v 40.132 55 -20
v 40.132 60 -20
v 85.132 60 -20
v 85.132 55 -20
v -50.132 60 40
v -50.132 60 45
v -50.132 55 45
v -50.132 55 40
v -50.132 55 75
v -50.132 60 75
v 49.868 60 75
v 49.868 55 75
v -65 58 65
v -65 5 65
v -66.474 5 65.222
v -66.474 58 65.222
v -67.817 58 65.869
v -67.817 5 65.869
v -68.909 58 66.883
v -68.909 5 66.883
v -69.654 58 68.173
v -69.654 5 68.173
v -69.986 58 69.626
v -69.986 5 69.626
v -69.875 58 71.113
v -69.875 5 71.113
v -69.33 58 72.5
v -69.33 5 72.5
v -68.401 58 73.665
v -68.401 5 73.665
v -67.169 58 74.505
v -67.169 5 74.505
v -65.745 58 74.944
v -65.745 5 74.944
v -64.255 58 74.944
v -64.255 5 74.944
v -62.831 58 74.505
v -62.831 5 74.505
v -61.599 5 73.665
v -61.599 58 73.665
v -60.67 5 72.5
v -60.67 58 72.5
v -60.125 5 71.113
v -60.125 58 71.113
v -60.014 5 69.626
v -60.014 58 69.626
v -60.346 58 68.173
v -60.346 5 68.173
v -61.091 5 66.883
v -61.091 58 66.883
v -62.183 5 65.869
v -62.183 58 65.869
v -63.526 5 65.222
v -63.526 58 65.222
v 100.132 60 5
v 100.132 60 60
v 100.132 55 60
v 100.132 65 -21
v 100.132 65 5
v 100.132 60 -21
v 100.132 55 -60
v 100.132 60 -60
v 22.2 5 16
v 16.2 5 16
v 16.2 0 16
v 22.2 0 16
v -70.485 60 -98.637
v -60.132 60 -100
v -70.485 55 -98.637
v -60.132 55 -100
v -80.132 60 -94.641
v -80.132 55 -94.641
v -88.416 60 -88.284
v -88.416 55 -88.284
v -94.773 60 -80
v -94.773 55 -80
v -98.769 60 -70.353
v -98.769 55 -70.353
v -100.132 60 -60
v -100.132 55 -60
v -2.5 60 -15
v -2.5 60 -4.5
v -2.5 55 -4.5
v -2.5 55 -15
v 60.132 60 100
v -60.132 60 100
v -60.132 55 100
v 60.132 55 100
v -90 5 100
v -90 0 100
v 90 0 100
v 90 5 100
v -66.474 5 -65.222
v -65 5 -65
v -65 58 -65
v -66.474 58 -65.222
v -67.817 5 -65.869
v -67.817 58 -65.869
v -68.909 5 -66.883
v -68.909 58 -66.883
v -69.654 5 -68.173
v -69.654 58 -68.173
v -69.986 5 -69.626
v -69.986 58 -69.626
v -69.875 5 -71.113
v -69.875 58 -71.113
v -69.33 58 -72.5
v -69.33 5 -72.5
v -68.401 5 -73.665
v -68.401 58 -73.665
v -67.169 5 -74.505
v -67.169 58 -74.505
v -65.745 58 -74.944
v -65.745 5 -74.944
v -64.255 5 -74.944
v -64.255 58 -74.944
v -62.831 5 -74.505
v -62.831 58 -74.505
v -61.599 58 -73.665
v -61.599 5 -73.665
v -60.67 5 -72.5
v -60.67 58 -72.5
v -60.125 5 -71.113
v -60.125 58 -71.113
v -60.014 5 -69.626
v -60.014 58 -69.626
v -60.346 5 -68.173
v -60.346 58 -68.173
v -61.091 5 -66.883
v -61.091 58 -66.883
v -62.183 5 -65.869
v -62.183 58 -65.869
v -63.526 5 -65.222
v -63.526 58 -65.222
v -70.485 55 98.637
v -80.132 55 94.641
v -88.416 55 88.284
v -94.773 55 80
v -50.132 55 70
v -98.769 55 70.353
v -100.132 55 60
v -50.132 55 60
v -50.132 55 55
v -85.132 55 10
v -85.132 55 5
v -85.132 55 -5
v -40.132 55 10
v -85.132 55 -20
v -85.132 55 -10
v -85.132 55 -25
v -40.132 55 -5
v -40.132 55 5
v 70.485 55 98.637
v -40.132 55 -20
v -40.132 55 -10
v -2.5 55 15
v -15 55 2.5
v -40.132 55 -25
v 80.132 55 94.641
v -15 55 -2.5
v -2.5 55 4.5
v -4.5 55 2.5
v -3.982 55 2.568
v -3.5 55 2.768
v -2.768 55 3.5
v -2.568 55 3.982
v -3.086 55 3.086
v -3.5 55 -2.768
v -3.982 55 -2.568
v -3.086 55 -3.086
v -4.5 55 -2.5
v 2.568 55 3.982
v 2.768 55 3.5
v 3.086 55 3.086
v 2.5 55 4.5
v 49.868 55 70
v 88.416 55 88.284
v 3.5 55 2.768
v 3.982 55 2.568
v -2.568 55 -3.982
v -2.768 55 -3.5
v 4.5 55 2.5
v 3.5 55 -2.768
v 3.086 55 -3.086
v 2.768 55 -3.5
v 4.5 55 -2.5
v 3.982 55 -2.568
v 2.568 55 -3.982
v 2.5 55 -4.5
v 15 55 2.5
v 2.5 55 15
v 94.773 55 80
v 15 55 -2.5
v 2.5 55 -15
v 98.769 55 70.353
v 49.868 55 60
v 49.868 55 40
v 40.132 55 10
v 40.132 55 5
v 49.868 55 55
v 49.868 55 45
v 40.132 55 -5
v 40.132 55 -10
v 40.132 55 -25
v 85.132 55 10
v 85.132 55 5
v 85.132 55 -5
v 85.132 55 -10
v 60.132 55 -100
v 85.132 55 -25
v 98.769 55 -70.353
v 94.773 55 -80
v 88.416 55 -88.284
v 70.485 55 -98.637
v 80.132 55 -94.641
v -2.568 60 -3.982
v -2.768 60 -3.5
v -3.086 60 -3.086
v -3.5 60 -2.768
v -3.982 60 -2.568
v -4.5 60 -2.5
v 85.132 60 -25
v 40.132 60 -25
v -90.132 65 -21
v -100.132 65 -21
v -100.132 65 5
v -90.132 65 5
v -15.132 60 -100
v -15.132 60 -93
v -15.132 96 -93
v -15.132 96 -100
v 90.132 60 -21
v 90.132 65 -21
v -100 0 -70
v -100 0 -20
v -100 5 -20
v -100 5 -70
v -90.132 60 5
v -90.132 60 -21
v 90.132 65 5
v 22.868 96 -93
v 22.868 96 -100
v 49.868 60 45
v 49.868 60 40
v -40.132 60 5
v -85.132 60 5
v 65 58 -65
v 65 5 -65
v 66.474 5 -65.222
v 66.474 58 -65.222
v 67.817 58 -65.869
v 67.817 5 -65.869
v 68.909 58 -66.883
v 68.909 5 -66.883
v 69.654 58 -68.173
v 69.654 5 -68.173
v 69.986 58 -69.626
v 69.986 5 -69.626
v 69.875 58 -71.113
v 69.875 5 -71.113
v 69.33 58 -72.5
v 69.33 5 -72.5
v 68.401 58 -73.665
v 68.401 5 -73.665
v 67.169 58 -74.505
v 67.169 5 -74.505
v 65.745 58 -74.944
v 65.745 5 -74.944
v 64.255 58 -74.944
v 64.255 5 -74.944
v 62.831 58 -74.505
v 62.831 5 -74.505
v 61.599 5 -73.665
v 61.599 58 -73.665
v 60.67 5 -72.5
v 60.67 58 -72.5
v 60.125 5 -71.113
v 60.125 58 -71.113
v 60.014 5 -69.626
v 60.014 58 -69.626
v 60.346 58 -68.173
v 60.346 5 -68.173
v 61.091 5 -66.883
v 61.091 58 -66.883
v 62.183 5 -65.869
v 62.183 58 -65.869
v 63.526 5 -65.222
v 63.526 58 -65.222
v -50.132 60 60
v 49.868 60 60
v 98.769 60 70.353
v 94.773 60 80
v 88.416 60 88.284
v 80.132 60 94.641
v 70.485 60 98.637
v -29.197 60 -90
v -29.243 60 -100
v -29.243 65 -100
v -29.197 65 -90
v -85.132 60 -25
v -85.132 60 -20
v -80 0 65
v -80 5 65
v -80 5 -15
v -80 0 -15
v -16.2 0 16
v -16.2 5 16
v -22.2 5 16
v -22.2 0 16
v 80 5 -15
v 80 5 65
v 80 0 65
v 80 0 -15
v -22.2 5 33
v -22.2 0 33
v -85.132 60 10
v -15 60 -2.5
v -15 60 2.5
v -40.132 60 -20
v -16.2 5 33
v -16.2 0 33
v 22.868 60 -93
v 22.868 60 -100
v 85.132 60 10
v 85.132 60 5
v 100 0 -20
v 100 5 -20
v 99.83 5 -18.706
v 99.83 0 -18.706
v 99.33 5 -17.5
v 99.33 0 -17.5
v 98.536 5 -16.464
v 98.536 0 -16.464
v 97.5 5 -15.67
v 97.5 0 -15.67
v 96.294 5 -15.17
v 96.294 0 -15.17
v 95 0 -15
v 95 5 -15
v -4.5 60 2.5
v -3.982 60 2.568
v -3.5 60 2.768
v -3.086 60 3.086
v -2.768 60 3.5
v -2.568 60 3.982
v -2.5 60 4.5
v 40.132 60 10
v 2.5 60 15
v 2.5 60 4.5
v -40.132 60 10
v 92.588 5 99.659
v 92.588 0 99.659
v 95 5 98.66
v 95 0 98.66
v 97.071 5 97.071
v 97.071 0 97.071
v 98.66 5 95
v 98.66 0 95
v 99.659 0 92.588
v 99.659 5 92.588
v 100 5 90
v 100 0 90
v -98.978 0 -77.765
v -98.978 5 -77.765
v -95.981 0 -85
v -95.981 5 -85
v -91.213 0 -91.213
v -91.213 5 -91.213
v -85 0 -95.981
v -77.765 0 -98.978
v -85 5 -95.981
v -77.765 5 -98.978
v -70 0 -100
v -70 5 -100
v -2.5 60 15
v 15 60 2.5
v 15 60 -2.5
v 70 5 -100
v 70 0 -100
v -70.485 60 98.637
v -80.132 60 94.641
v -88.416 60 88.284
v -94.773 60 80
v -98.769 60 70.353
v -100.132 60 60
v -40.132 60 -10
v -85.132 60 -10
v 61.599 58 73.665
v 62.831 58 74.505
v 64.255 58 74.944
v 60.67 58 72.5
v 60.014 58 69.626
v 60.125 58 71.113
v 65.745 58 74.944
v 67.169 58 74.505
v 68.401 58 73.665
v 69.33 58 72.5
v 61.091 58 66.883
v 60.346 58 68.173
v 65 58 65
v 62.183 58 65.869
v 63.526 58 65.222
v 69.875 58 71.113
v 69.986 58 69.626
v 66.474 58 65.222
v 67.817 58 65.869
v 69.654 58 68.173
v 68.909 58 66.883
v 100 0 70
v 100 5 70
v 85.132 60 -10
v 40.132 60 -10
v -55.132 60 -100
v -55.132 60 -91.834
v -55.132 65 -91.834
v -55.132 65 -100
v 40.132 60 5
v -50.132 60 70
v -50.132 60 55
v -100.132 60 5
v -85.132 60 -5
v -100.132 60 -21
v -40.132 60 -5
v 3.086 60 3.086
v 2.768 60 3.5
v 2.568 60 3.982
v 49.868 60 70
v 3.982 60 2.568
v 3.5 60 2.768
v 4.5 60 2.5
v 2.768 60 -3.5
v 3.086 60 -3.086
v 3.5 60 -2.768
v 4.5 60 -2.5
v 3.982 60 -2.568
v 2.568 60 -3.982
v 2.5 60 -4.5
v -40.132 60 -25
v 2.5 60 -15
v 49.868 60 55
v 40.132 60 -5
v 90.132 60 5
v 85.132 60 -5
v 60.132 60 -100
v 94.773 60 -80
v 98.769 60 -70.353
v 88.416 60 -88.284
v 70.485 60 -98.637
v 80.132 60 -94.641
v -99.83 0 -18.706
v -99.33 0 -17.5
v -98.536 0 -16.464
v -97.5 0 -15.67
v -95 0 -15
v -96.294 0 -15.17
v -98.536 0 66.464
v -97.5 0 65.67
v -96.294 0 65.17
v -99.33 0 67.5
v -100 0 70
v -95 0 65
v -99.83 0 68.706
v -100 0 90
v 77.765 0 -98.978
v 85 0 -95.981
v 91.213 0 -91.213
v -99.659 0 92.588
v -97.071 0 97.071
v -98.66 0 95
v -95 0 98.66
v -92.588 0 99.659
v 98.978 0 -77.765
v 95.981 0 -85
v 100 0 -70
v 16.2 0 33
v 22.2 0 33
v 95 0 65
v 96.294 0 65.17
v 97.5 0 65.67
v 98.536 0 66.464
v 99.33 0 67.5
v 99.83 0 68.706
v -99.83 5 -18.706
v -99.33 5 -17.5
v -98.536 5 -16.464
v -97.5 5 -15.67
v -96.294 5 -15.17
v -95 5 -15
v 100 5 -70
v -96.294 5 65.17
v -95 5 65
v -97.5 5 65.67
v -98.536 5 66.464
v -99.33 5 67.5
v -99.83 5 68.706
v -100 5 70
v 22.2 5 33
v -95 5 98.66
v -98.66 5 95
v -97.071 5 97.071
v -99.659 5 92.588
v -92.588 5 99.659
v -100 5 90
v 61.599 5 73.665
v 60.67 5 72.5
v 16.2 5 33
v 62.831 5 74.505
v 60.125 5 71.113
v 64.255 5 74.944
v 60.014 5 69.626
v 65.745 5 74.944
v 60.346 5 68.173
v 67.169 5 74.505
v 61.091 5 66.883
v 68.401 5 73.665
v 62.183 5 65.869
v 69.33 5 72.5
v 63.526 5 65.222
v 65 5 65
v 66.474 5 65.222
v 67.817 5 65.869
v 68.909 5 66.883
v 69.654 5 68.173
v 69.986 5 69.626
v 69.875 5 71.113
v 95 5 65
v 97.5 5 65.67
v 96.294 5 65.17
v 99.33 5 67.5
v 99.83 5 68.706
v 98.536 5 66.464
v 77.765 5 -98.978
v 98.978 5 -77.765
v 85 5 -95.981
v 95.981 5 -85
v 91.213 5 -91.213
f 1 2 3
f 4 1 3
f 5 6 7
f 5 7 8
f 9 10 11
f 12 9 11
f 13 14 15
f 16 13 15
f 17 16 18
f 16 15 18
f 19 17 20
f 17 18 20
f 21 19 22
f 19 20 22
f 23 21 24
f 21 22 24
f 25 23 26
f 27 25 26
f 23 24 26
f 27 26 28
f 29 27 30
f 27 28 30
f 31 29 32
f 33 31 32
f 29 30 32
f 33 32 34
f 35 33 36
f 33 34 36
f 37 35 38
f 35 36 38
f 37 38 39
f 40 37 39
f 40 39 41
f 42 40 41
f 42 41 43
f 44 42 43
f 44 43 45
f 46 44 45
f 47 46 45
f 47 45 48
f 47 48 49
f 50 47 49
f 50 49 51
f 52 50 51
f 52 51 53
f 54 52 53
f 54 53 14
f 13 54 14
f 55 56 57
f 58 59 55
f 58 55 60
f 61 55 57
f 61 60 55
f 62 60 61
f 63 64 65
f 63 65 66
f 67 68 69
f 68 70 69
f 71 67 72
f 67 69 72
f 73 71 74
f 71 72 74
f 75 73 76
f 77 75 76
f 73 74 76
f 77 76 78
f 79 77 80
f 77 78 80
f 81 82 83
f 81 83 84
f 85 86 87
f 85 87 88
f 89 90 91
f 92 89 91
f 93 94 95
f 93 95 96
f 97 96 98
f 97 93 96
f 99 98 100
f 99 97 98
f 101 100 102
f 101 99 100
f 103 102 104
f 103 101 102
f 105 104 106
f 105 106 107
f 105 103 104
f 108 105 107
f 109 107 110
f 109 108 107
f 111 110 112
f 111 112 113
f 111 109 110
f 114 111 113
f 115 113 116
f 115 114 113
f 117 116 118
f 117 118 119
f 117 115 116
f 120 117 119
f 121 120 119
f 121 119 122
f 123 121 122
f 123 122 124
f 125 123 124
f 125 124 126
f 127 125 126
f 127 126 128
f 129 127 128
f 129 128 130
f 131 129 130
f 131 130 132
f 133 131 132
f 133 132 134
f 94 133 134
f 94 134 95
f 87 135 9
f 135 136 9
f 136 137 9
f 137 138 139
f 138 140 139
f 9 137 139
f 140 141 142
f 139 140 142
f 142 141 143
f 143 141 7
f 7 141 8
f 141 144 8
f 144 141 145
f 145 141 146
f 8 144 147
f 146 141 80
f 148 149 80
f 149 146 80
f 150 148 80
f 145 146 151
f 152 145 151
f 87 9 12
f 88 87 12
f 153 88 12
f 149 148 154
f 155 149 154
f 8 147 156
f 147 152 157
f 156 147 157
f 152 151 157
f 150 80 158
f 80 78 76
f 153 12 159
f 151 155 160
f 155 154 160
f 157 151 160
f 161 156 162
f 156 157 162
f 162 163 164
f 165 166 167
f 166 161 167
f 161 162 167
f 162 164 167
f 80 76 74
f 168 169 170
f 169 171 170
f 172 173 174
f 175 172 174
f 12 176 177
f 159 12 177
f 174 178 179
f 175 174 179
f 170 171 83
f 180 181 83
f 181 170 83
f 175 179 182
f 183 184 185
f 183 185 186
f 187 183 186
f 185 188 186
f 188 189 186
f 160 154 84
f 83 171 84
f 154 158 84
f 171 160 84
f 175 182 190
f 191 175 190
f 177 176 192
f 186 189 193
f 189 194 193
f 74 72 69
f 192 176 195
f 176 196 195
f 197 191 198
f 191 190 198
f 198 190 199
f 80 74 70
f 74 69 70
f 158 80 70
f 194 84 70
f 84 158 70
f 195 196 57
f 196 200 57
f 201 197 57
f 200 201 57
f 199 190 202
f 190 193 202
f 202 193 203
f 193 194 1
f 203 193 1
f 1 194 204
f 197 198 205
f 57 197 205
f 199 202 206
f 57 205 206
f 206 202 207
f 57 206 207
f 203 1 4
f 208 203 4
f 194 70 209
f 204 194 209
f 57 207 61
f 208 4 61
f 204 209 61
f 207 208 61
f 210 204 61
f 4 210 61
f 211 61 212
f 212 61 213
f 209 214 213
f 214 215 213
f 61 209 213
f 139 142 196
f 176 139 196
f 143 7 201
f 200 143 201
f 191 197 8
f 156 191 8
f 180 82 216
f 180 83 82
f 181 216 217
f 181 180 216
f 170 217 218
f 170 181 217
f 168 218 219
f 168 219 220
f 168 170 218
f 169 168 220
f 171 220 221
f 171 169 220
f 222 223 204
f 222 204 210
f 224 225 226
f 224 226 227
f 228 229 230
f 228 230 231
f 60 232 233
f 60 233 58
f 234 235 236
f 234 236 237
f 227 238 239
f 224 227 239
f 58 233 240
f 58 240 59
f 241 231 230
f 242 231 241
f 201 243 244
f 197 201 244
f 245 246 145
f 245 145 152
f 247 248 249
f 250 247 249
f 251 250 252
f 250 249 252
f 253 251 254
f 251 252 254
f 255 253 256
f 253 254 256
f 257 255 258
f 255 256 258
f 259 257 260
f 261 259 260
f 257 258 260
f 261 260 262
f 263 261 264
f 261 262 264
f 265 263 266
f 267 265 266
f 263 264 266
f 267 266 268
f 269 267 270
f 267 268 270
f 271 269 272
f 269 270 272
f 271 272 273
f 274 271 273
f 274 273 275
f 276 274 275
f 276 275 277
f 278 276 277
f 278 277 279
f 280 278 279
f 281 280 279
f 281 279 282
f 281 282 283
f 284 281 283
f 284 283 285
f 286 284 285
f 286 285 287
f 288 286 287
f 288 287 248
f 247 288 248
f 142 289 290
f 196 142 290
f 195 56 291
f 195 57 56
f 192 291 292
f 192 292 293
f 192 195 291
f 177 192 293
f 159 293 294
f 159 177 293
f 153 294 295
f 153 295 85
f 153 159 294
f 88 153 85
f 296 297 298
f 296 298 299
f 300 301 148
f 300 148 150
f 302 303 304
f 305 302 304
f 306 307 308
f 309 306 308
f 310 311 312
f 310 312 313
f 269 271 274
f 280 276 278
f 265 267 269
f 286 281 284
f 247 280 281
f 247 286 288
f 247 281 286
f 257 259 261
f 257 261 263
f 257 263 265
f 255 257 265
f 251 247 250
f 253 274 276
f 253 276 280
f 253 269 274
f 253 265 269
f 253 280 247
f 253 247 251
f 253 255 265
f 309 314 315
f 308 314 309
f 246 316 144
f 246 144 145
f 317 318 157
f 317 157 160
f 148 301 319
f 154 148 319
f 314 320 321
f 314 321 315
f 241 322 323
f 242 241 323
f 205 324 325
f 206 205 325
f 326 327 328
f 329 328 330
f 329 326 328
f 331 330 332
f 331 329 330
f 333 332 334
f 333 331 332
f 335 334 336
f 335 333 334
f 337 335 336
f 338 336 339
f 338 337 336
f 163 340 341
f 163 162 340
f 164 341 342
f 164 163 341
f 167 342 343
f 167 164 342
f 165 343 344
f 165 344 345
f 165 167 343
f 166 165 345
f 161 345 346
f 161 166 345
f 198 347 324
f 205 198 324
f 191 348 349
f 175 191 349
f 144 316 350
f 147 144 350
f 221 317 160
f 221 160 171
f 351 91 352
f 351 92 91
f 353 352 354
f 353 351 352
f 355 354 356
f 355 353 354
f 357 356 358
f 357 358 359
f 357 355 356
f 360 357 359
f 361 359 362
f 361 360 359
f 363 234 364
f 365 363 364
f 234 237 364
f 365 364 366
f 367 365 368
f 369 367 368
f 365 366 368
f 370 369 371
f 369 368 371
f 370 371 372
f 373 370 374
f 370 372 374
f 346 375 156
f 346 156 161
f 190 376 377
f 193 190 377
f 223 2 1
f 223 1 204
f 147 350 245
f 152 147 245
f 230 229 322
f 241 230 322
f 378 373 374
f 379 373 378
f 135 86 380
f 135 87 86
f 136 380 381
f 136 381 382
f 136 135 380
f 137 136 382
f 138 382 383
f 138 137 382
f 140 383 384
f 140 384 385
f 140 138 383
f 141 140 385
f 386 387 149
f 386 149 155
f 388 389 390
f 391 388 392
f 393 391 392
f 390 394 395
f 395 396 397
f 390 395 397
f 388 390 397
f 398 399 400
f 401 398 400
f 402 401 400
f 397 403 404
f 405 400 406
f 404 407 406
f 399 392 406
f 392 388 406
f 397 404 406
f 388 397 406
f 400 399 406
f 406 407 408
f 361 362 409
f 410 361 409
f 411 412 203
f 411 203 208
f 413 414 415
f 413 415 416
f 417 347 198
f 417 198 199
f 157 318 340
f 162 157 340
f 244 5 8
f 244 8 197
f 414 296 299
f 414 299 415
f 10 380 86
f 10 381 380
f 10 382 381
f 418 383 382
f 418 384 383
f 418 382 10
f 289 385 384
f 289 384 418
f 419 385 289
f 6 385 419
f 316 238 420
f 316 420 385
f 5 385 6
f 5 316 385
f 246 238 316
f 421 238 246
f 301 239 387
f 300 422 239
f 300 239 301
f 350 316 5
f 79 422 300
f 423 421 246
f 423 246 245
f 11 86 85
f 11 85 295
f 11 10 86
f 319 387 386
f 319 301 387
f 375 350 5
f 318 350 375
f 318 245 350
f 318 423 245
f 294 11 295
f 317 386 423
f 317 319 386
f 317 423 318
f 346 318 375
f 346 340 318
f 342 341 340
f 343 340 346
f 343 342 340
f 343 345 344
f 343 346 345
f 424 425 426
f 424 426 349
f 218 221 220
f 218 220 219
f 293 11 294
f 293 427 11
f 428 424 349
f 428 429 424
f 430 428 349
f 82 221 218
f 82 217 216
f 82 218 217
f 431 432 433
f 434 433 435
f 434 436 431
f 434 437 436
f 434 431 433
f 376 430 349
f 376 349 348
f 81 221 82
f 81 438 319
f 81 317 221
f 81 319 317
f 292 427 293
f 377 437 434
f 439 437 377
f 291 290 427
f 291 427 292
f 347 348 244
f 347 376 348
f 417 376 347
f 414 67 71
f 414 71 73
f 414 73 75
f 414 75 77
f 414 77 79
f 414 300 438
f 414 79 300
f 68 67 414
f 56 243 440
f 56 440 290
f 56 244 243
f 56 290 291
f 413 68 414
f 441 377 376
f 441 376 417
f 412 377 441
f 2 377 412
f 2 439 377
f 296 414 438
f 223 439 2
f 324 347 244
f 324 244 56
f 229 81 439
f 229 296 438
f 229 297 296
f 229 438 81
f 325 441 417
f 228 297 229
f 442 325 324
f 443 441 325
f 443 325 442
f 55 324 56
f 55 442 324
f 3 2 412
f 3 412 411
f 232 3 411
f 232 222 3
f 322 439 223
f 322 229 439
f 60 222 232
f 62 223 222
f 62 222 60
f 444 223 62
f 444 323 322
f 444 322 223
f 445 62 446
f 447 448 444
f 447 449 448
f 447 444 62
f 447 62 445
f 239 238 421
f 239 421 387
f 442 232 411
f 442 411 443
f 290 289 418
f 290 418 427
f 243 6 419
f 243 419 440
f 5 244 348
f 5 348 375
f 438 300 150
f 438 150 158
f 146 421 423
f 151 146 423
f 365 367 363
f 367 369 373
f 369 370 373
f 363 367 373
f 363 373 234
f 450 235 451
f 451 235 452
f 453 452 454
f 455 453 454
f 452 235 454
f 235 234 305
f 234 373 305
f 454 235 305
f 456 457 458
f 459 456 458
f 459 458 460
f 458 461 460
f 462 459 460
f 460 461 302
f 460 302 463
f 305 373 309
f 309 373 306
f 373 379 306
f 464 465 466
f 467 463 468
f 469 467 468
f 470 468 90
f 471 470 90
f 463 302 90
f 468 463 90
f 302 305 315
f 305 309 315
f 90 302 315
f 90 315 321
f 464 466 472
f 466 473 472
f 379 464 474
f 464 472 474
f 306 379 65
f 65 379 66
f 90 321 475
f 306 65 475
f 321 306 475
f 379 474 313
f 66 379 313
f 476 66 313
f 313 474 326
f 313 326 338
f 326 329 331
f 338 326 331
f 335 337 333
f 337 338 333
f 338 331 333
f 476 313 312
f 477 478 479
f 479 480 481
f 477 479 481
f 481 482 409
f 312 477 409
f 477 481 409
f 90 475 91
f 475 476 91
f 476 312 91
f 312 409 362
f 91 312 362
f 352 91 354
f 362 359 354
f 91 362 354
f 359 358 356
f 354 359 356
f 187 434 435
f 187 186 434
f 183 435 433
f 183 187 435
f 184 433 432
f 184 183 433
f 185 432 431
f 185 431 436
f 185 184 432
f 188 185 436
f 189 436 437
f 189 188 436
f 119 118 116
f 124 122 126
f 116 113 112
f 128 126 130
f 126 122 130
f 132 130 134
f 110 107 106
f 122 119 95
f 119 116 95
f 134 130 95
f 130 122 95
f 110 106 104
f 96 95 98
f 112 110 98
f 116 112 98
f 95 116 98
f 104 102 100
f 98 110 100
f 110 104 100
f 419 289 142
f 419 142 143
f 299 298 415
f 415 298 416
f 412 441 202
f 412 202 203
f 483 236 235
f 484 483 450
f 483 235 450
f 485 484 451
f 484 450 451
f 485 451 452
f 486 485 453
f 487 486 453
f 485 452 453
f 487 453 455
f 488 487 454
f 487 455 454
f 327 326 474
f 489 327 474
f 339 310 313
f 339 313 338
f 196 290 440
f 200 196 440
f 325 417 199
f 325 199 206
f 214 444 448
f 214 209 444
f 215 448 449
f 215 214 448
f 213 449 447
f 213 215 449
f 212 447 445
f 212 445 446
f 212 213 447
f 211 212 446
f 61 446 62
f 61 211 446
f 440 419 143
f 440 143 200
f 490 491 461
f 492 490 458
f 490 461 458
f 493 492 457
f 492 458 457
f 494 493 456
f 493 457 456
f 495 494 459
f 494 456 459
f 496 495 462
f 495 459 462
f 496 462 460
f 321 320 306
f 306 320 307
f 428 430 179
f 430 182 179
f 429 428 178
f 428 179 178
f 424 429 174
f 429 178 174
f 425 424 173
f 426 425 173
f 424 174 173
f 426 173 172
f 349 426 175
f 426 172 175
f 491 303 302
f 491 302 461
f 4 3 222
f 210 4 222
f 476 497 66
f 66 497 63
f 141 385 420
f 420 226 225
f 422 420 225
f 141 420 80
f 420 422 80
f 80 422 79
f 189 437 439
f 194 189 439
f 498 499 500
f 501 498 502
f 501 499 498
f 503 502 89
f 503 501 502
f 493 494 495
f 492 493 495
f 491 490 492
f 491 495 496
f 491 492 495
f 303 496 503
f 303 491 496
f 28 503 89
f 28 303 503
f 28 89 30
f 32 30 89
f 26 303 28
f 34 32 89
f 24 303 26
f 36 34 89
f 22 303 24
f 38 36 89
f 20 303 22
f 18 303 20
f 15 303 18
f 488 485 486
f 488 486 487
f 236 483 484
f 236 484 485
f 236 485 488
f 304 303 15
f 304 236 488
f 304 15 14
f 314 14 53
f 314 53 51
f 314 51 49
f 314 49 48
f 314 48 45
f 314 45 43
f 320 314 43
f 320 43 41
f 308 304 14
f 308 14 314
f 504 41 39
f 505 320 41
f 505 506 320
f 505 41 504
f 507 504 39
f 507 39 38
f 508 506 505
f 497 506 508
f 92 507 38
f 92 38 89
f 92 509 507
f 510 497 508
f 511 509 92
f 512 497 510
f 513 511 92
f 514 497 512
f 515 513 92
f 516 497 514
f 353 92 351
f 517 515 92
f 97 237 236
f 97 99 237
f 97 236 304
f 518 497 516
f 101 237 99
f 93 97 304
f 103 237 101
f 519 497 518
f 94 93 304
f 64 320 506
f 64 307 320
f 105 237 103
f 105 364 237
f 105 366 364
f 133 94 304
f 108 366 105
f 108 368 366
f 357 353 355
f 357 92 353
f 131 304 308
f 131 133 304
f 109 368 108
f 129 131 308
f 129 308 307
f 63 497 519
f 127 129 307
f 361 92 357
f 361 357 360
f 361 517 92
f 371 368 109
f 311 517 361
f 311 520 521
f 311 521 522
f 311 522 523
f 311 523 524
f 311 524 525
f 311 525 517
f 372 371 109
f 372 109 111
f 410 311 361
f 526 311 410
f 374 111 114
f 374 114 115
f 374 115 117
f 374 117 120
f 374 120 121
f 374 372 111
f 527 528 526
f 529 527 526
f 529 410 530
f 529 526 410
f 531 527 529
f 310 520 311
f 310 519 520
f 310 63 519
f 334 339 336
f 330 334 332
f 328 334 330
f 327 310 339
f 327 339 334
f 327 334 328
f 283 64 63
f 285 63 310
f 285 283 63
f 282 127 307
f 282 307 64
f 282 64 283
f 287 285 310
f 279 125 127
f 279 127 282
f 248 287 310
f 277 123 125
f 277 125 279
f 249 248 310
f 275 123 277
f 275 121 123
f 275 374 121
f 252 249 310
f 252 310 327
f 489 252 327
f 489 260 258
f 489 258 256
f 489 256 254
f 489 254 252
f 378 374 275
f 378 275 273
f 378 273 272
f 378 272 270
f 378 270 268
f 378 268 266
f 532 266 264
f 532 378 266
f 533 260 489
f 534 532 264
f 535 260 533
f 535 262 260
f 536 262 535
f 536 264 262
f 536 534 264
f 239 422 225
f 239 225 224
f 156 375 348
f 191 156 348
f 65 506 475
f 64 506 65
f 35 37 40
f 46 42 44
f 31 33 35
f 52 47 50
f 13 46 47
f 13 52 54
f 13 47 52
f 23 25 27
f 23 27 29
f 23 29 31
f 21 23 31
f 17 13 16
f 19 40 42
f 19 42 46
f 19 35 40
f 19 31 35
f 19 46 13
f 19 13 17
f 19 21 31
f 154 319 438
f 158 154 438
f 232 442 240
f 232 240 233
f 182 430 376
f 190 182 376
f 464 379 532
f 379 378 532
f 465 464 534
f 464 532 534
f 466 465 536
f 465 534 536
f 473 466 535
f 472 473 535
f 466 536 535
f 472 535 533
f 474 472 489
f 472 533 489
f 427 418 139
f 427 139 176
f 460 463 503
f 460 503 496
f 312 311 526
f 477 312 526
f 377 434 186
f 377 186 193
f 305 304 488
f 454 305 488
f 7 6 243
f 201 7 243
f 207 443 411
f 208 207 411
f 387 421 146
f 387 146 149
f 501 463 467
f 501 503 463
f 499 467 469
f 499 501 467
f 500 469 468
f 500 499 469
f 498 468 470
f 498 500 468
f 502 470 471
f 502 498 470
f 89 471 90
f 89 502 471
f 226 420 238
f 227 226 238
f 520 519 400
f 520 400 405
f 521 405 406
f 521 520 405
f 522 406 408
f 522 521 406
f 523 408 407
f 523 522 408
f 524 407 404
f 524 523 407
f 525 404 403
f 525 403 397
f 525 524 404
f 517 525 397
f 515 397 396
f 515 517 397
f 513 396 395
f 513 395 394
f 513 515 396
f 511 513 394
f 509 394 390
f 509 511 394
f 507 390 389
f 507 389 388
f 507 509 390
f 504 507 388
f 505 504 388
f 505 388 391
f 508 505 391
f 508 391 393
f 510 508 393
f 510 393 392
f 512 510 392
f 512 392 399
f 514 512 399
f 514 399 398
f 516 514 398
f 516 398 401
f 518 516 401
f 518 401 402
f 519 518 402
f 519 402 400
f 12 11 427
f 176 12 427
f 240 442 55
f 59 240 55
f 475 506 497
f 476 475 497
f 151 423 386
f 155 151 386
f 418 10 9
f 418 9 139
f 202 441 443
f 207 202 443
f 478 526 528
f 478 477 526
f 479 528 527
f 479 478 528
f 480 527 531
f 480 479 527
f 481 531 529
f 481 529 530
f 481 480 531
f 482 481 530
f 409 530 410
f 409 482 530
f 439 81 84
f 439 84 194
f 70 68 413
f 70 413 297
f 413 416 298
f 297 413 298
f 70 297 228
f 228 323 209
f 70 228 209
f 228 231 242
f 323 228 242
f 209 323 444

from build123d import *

# Parameters (mm, degrees)
SKETCH1_W                = 200
SKETCH1_H                = 200
BOSS_EXTRUDE1_DEPTH      = 5
FILLET1_R                = 10
FILLET3_R                = 30
SKETCH5_W                = 20
SKETCH5_H                = 80
CUT_EXTRUDE2_DEPTH       = 142.509716981
BOSS_EXTRUDE3_DEPTH      = 100
BOSS_EXTRUDE3_DEPTH_BACK = 100
SKETCH8_W                = 240
SKETCH8_H                = 5
SKETCH9_R                = 5
BOSS_EXTRUDE4_DEPTH      = 58
MIRROR6_COPY_1_SKETCH_R  = 5
MIRROR6_COPY_1_DEPTH     = 58
FILLET4_R                = 5
SKETCH11_W               = 12.5
SKETCH11_H               = 5
SKETCH11_W_2             = 5
SKETCH11_H_2             = 12.5
CUT_EXTRUDE4_DEPTH       = 5
FILLET6_R                = 2
SKETCH15_W               = 100
SKETCH15_H               = 5
SKETCH15_W_2             = 45
CUT_EXTRUDE6_DEPTH       = 5
SKETCH18_W               = 20
SKETCH18_H               = 200
CUT_EXTRUDE7_DEPTH       = 5
FILLET7_R                = 40
SKETCH22_W               = 6
SKETCH22_H               = 17
CUT_EXTRUDE10_DEPTH      = 5
SKETCH26_W               = 10
SKETCH26_H               = 26
BOSS_EXTRUDE6_DEPTH      = 5
SKETCH27_W               = 38
SKETCH27_H               = 7
BOSS_EXTRUDE7_DEPTH      = 36


with BuildPart() as part:
    # Sketch1 → Boss-Extrude1 (new body)
    with BuildSketch(Plane(origin=(0, 0, 0), x_dir=(1, 0, 0), z_dir=(0, 1, 0))):
        Rectangle(SKETCH1_W, SKETCH1_H)
    extrude(amount=BOSS_EXTRUDE1_DEPTH)

    # Fillet1
    fillet1_edges = [part.edges().sort_by_distance(p)[0] for p in [
        (100, 2.5, 100),
        (-100, 2.5, 100),
    ]]
    fillet(fillet1_edges, radius=FILLET1_R)

    # Fillet3
    fillet3_edges = [part.edges().sort_by_distance(p)[0] for p in [
        (-100, 2.5, -100),
        (100, 2.5, -100),
    ]]
    fillet(fillet3_edges, radius=FILLET3_R)

    # Sketch5 → Cut-Extrude2 (cut, through all)
    with BuildSketch(Plane(origin=(0, 5, 0), x_dir=(1, 0, 0), z_dir=(0, 1, 0))):
        with Locations((90, -25)):
            Rectangle(SKETCH5_W, SKETCH5_H)
    cut_extrude2 = extrude(amount=-CUT_EXTRUDE2_DEPTH, mode=Mode.SUBTRACT)

    # Mirror1: Cut-Extrude2 across plane
    add(cut_extrude2.mirror(Plane(origin=(0, 0, 0), x_dir=(0, 0, 1), z_dir=(1, 0, 0))), mode=Mode.SUBTRACT)

    # Sketch9 → Boss-Extrude4 (add)
    with BuildSketch(Plane(origin=(0, 0, 0), x_dir=(1, 0, 0), z_dir=(0, 1, 0))):
        with Locations(Location((-65, -70, 0), (0, 0, 90))):
            Circle(SKETCH9_R)
    boss_extrude4 = extrude(amount=BOSS_EXTRUDE4_DEPTH)

    # Mirror5: Boss-Extrude4 across plane
    add(boss_extrude4.mirror(Plane(origin=(0, 0, 0), x_dir=(0, 0, 1), z_dir=(1, 0, 0))))

    # Mirror6: Boss-Extrude4 across plane
    add(boss_extrude4.mirror(Plane.XY))

    # Mirror6 copy 1 sketch → Mirror6 copy 1 (add)
    with BuildSketch(Plane(origin=(0, 0, 0), x_dir=(-1, 0, 0), z_dir=(0, 1, 0))):
        with Locations(Location((-65, -70, 0), (0, 0, 90))):
            Circle(MIRROR6_COPY_1_SKETCH_R)
    extrude(amount=MIRROR6_COPY_1_DEPTH)

    # Fillet4
    fillet4_edges = [part.edges().sort_by_distance(p)[0] for p in [
        (100, 2.5, -15),
        (100, 2.5, 65),
        (-100, 2.5, 65),
        (-100, 2.5, -15),
    ]]
    fillet(fillet4_edges, radius=FILLET4_R)

    # Sketch22 → Cut-Extrude10 (cut)
    with BuildSketch(Plane(origin=(0, 5, 0), x_dir=(1, 0, 0), z_dir=(0, 1, 0))):
        with Locations((19.2, -24.5)):
            Rectangle(SKETCH22_W, SKETCH22_H)
    cut_extrude10 = extrude(amount=-CUT_EXTRUDE10_DEPTH, mode=Mode.SUBTRACT)

    # Mirror8: Cut-Extrude10 across plane
    add(cut_extrude10.mirror(Plane(origin=(0, 0, 0), x_dir=(0, 0, 1), z_dir=(1, 0, 0))), mode=Mode.SUBTRACT)


with BuildPart() as body_2:
    # Sketch8 → Boss-Extrude3 (new, two sides: drawn at the far end of the back side and taken through both)
    with BuildSketch(Plane.XY.offset(-BOSS_EXTRUDE3_DEPTH_BACK)):
        with Locations((-0.132111847, 57.5)):
            Rectangle(SKETCH8_W, SKETCH8_H)
    extrude(amount=BOSS_EXTRUDE3_DEPTH + BOSS_EXTRUDE3_DEPTH_BACK)

    # Sketch11 → Cut-Extrude4 (cut)
    with BuildSketch(Plane(origin=(0, 60, 0), x_dir=(1, 0, 0), z_dir=(0, 1, 0))):
        with Locations((8.75, 0)):
            Rectangle(SKETCH11_W, SKETCH11_H)
        with Locations((0, -8.75)):
            Rectangle(SKETCH11_W_2, SKETCH11_H_2)
        with Locations((-8.75, 0)):
            Rectangle(SKETCH11_W, SKETCH11_H)
        with Locations((0, 8.75)):
            Rectangle(SKETCH11_W_2, SKETCH11_H_2)
        Rectangle(SKETCH11_W_2, SKETCH11_H)
    extrude(amount=-CUT_EXTRUDE4_DEPTH, mode=Mode.SUBTRACT)

    # Fillet6
    fillet6_edges = [body_2.edges().sort_by_distance(p)[0] for p in [
        (2.5, 57.5, 2.5),
        (-2.5, 57.5, 2.5),
        (-2.5, 57.5, -2.5),
        (2.5, 57.5, -2.5),
    ]]
    fillet(fillet6_edges, radius=FILLET6_R)

    # Sketch15 → Cut-Extrude6 (cut)
    with BuildSketch(Plane(origin=(0, 60, 0), x_dir=(1, 0, 0), z_dir=(0, 1, 0))):
        with Locations((-0.132111847, -42.5)):
            Rectangle(SKETCH15_W, SKETCH15_H)
        with Locations((-0.132111847, -57.5)):
            Rectangle(SKETCH15_W, SKETCH15_H)
        with Locations((-0.132111847, -72.5)):
            Rectangle(SKETCH15_W, SKETCH15_H)
        with Locations((-62.632111847, -7.5)):
            Rectangle(SKETCH15_W_2, SKETCH15_H)
        with Locations((-62.632111847, 7.5)):
            Rectangle(SKETCH15_W_2, SKETCH15_H)
        with Locations((-62.632111847, 22.5)):
            Rectangle(SKETCH15_W_2, SKETCH15_H)
        with Locations((62.632111847, -7.5)):
            Rectangle(SKETCH15_W_2, SKETCH15_H)
        with Locations((62.632111847, 7.5)):
            Rectangle(SKETCH15_W_2, SKETCH15_H)
        with Locations((62.632111847, 22.5)):
            Rectangle(SKETCH15_W_2, SKETCH15_H)
    extrude(amount=-CUT_EXTRUDE6_DEPTH, mode=Mode.SUBTRACT)

    # Sketch18 → Cut-Extrude7 (cut)
    with BuildSketch(Plane(origin=(0, 60, 0), x_dir=(1, 0, 0), z_dir=(0, 1, 0))):
        with Locations((-110.132111847, 0)):
            Rectangle(SKETCH18_W, SKETCH18_H)
    cut_extrude7 = extrude(amount=-CUT_EXTRUDE7_DEPTH, mode=Mode.SUBTRACT)

    # Mirror7: Cut-Extrude7 across plane
    add(cut_extrude7.mirror(Plane(origin=(0, 0, 0), x_dir=(0, 0, 1), z_dir=(1, 0, 0))), mode=Mode.SUBTRACT)

    # Fillet7
    fillet7_edges = [body_2.edges().sort_by_distance(p)[0] for p in [
        (-100.132111847, 57.5, -100),
        (-100.132111847, 57.5, 100),
        (100.132111847, 57.5, 100),
        (100.132111847, 57.5, -100),
    ]]
    fillet(fillet7_edges, radius=FILLET7_R)

    # Sketch26 → Boss-Extrude6 (add)
    with BuildSketch(Plane(origin=(0, 60, 0), x_dir=(1, 0, 0), z_dir=(0, 1, 0))):
        with Locations((95.132111847, 8)):
            Rectangle(SKETCH26_W, SKETCH26_H)
        with Locations((-95.132111847, 8)):
            Rectangle(SKETCH26_W, SKETCH26_H)
        Polygon((-55.132111847, 91.834478025), (-55.132111847, 100), (-29.242880108, 100), (-29.19690261, 90.000105697), align=None)
    extrude(amount=BOSS_EXTRUDE6_DEPTH)

    # Sketch27 → Boss-Extrude7 (add)
    with BuildSketch(Plane(origin=(0, 60, 0), x_dir=(1, 0, 0), z_dir=(0, 1, 0))):
        with Locations((3.867888153, 96.5)):
            Rectangle(SKETCH27_W, SKETCH27_H)
    extrude(amount=BOSS_EXTRUDE7_DEPTH)


solid = Compound([part.part, body_2.part])
